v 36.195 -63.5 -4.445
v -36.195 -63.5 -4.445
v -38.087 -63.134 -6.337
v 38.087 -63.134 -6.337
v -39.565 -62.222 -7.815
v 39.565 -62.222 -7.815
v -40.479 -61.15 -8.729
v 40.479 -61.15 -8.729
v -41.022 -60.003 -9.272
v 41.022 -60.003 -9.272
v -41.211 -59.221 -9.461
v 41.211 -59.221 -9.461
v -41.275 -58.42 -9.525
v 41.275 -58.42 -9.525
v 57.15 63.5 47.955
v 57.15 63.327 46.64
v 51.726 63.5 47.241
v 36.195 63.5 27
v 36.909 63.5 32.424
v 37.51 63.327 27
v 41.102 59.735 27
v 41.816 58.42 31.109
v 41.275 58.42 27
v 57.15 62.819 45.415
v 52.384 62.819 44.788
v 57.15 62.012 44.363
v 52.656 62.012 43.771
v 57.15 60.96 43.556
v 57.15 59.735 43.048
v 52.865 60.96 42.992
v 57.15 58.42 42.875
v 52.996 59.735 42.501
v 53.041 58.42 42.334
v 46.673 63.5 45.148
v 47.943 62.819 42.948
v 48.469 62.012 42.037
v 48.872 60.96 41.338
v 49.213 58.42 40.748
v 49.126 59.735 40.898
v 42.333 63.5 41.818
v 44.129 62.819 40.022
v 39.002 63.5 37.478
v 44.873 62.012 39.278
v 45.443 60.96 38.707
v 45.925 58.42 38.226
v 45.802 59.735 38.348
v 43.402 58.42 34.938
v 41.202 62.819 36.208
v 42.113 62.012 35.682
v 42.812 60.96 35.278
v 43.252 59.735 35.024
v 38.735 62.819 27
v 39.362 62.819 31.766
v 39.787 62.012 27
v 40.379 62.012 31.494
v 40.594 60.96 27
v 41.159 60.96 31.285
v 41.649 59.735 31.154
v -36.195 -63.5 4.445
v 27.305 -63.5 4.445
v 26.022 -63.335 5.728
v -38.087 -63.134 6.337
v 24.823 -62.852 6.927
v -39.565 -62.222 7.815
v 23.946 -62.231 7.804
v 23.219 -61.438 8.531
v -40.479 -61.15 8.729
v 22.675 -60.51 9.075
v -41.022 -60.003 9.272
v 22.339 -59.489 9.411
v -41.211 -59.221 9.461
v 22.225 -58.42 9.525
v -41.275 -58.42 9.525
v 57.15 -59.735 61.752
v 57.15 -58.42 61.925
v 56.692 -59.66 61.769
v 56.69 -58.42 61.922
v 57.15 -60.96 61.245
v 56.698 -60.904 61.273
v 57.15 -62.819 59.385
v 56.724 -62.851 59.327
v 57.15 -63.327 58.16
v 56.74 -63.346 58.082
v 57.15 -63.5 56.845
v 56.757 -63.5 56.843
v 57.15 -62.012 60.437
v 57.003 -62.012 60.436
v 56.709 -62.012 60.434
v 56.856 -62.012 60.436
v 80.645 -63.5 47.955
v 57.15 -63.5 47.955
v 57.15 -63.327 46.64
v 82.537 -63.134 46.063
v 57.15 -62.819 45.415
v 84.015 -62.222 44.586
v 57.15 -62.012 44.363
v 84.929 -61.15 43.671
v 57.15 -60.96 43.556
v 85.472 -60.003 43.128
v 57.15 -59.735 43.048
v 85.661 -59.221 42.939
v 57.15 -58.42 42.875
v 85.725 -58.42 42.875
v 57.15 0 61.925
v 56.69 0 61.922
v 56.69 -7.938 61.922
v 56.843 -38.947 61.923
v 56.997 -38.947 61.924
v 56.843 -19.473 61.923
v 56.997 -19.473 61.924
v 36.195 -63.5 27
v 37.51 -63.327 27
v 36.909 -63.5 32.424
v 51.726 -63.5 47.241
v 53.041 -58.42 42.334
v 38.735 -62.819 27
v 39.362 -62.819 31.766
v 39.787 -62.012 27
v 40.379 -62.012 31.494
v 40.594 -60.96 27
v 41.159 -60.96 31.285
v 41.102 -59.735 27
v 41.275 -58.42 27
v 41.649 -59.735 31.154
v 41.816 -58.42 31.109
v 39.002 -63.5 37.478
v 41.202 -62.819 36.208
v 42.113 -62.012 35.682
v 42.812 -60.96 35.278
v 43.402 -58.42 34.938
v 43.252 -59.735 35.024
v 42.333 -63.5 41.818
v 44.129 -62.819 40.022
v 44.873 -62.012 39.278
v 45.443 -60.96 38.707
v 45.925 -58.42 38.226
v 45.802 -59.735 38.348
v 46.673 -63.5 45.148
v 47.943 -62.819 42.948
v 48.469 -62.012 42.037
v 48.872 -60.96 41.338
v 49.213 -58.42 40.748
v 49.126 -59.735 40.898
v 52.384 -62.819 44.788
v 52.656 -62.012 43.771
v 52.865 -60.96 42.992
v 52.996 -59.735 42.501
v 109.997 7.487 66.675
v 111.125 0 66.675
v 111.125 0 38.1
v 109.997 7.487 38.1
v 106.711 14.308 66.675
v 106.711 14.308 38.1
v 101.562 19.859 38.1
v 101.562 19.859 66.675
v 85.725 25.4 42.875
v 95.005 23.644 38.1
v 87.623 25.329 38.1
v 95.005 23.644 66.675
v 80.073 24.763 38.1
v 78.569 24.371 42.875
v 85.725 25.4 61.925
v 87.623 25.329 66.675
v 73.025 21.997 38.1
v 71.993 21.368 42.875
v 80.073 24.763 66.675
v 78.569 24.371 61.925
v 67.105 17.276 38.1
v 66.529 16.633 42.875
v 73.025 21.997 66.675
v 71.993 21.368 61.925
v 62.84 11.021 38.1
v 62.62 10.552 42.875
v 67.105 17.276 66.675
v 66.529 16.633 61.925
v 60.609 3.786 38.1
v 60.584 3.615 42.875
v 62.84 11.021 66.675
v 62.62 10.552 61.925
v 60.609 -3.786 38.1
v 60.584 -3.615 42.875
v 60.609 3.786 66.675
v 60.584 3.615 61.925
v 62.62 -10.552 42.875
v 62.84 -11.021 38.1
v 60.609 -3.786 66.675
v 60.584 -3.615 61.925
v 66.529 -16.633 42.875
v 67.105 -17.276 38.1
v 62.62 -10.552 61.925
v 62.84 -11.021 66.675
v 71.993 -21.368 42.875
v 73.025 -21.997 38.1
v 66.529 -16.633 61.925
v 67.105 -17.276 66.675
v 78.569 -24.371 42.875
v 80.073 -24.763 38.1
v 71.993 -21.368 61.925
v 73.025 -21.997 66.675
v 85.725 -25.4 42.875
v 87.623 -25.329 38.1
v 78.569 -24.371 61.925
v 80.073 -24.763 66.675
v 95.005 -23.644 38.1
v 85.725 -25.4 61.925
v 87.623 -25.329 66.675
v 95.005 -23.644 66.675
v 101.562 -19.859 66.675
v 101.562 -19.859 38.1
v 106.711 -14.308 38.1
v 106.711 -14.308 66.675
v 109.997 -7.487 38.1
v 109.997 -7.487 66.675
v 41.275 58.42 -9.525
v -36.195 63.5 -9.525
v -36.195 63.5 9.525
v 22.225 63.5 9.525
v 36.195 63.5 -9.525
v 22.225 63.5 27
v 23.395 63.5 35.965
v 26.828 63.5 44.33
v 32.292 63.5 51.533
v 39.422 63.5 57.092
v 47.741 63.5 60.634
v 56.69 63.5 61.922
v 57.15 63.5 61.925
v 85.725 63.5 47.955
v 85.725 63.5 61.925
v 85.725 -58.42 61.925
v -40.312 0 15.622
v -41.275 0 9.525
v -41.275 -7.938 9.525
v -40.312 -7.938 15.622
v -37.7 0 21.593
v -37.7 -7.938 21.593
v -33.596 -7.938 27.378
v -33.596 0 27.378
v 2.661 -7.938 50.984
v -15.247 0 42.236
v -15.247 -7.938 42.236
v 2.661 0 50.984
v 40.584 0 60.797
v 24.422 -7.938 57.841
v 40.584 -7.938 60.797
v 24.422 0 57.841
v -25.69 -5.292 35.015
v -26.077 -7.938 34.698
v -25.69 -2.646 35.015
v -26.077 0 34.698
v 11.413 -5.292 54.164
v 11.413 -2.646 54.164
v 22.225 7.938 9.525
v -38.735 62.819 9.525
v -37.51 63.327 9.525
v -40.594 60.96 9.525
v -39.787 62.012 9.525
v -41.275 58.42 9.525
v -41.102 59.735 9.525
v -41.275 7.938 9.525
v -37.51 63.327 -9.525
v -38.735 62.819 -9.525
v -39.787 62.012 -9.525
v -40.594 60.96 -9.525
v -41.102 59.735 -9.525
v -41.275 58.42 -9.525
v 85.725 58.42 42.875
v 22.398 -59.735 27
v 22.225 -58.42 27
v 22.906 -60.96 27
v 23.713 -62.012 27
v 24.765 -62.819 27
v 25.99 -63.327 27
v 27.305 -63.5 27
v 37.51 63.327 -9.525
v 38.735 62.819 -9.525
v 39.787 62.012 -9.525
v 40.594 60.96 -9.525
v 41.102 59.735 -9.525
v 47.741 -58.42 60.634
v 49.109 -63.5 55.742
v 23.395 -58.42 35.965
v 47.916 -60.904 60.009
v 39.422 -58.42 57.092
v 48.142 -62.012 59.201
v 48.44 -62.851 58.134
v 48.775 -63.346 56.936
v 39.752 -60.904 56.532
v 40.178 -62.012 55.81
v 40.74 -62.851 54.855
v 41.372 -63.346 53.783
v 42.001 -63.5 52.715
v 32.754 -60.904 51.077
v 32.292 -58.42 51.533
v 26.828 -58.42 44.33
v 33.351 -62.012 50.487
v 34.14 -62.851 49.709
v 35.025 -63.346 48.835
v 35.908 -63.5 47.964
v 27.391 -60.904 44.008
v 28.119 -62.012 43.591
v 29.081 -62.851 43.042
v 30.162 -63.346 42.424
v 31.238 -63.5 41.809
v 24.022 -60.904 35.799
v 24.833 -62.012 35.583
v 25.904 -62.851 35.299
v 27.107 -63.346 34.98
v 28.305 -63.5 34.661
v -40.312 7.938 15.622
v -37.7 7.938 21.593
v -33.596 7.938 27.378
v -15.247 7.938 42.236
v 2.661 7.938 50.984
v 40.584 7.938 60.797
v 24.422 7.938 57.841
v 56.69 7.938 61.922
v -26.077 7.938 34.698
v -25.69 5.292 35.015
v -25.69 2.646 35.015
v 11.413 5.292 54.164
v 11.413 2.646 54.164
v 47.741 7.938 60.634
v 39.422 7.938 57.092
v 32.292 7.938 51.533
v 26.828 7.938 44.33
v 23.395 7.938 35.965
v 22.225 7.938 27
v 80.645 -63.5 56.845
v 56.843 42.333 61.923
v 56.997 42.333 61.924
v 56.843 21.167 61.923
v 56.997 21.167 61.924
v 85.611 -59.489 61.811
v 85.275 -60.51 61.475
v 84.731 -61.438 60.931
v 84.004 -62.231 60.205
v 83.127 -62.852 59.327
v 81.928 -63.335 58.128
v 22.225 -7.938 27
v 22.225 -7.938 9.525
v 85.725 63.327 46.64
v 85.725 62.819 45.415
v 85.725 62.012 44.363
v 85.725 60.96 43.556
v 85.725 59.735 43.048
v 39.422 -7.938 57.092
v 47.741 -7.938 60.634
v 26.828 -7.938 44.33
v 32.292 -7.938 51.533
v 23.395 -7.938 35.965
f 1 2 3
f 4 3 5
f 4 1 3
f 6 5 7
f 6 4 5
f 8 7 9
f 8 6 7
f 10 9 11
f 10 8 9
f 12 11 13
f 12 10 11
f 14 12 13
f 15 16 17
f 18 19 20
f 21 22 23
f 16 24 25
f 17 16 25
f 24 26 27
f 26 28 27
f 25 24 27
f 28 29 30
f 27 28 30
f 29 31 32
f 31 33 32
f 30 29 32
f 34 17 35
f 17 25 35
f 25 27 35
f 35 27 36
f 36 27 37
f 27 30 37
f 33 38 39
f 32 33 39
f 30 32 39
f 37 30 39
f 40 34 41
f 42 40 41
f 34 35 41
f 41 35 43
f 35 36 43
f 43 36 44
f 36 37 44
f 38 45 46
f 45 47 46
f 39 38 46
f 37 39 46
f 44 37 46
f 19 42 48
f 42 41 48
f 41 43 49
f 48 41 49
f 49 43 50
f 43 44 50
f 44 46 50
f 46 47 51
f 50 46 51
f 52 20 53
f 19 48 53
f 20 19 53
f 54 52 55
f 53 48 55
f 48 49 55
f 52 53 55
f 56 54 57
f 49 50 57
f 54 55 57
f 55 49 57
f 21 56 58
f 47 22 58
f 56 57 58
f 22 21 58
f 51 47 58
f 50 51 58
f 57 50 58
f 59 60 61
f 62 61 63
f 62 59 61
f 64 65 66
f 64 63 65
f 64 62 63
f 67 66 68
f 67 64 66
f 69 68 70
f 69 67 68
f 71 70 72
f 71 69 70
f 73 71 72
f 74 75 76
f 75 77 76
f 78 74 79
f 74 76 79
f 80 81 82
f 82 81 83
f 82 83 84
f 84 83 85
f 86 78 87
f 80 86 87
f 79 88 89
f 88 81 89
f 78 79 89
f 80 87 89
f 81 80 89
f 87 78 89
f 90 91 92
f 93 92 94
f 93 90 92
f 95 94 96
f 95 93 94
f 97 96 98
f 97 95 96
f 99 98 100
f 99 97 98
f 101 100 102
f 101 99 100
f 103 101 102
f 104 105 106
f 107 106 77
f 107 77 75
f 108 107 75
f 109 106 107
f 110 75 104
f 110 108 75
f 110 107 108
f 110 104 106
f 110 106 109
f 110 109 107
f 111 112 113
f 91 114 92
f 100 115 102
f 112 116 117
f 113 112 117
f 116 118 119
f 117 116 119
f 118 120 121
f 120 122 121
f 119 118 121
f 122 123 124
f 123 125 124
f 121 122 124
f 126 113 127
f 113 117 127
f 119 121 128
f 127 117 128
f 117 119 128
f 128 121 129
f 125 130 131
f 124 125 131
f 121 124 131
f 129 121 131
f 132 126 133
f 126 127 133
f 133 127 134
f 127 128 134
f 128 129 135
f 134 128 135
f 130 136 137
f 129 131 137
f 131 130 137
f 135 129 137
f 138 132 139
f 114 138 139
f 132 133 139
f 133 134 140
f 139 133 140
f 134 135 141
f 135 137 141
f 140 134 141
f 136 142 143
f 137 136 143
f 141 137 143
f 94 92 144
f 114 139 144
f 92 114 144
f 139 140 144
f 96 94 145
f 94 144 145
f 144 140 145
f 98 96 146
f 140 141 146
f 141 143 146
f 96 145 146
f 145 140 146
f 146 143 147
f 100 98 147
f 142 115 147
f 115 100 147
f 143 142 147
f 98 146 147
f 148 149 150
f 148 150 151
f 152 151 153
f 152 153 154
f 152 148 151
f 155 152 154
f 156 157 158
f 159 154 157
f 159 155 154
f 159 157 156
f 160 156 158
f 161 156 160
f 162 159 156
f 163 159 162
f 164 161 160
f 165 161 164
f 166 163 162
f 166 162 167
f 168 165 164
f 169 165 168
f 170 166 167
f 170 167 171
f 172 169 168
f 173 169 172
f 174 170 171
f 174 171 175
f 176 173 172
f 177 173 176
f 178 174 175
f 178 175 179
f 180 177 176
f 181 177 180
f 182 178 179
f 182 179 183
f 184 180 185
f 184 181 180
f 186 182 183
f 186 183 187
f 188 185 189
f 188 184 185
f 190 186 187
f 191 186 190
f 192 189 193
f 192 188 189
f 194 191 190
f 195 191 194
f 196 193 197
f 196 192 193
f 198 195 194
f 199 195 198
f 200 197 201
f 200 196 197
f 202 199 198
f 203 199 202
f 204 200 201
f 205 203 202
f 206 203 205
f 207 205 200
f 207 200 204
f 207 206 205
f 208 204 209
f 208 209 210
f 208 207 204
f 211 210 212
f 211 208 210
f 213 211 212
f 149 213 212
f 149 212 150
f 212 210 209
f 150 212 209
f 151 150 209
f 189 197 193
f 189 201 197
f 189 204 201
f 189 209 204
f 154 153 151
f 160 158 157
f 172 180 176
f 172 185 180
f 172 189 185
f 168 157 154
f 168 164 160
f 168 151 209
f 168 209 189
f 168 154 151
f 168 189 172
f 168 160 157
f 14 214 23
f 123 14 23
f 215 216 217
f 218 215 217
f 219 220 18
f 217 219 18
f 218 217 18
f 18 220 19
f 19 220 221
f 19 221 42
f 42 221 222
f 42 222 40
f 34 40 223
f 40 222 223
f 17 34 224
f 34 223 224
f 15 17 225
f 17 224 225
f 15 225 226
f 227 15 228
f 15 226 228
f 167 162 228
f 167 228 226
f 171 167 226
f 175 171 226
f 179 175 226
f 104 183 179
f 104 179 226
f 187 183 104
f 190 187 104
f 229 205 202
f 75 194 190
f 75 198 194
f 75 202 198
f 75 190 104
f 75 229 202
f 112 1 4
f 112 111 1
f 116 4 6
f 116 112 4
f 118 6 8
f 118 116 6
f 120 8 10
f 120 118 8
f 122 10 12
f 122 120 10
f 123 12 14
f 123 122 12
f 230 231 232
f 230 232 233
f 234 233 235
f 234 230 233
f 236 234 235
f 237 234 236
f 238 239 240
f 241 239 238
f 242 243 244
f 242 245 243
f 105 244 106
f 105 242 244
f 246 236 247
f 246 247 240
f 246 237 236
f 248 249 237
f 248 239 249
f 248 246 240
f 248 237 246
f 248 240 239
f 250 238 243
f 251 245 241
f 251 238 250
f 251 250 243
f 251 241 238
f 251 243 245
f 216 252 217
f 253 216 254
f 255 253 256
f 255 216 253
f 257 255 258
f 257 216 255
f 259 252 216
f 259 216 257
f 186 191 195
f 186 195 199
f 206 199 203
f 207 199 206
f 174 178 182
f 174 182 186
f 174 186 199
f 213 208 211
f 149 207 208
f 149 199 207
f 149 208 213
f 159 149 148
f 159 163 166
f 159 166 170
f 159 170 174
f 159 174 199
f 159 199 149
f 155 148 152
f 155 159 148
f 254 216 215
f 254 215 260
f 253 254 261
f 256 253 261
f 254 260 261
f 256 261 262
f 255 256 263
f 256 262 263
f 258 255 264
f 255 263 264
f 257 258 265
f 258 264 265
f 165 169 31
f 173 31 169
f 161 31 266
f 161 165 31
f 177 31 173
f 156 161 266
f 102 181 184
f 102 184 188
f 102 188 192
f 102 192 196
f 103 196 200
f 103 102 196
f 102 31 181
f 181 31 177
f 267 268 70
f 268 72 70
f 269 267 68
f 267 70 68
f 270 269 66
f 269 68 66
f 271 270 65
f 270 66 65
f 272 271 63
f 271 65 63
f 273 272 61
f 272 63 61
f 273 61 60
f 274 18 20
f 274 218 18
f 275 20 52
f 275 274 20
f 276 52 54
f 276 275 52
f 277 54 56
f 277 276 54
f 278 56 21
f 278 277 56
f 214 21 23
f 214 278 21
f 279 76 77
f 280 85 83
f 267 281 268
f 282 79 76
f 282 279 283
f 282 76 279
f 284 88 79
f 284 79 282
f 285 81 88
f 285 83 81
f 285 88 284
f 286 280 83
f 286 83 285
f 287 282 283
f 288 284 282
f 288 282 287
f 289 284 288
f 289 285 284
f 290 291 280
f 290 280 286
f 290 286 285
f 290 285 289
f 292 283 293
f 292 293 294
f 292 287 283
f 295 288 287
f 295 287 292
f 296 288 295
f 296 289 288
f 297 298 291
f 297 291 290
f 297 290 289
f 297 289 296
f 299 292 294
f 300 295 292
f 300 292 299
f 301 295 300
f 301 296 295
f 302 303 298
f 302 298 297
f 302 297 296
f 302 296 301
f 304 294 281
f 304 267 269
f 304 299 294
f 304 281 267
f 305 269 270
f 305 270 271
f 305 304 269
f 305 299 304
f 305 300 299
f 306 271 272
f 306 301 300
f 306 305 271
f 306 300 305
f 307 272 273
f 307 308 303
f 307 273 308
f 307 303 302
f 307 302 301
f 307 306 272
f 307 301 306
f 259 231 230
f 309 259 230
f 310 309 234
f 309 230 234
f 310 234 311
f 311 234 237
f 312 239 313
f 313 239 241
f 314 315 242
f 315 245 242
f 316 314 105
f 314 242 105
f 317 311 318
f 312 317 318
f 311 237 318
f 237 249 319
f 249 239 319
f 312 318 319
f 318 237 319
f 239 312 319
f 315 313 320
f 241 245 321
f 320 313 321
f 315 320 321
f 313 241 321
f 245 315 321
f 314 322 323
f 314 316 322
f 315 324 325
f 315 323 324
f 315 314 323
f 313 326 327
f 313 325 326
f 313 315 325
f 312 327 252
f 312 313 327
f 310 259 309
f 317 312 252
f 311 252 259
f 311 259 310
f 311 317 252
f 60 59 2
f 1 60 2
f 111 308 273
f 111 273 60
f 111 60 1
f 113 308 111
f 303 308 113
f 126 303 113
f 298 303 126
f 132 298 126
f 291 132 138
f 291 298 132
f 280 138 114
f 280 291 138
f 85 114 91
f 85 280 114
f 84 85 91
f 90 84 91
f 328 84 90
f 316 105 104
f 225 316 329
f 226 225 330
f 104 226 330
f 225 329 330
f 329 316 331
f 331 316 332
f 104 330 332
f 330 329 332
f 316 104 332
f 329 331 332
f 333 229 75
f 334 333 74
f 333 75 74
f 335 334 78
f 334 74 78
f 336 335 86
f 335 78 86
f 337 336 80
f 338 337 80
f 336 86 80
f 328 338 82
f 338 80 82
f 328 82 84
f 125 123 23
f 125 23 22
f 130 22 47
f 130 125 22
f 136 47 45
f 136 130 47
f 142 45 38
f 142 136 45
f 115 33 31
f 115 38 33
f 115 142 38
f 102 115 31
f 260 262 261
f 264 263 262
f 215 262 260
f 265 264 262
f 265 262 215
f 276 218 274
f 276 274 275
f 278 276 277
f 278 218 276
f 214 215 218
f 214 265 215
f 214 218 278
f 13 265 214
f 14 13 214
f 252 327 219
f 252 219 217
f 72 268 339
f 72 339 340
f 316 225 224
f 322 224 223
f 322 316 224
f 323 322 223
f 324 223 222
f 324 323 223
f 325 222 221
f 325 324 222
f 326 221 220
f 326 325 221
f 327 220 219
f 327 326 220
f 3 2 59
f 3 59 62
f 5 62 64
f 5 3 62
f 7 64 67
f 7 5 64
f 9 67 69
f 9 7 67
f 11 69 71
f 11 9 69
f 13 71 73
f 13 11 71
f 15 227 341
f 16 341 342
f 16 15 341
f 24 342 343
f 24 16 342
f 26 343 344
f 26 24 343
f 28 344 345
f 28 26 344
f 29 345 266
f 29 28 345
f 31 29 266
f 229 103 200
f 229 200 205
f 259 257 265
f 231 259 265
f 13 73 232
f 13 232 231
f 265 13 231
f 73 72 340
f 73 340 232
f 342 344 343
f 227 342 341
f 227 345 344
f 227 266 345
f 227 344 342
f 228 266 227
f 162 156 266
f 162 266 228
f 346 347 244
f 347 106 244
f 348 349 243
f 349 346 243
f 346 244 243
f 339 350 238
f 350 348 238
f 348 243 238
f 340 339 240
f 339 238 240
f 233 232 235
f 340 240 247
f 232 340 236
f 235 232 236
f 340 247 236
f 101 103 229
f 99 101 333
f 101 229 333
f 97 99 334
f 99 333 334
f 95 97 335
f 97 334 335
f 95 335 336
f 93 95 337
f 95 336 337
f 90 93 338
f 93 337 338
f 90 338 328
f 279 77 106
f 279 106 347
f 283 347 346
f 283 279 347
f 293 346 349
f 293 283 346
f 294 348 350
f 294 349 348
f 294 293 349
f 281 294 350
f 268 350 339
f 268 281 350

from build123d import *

# Parameters (mm, degrees)
F1_DEPTH = 63.5
F0_W     = 25.4
F0_H     = 19.05
F2_DEPTH = 63.5
F3_DEPTH = 7.9375
F5_R     = 5.08


with BuildPart() as f1:
    # F0 (on Front) → F1 (new body, symmetric)
    with BuildSketch(Plane.XZ):
        Polygon((-41.275, 9.525), (-41.275, -9.525), (41.275, -9.525), (41.275, 9.525), (22.225, 9.525), align=None)
    extrude(amount=F1_DEPTH, both=True)

    # F0 (on Front) → F2 (join, symmetric)
    with BuildSketch(Plane.XZ):
        with BuildLine():
            Line((22.225, 9.525), (41.275, 9.525))
            Line((41.275, 9.525), (41.275, 27.0002))
            ThreePointArc((41.275, 27.0002), (45.9246798487, 38.2255201513), (57.15, 42.8752))
            Line((57.15, 42.8752), (60.325, 42.8752))
            Line((60.325, 42.8752), (60.325, 61.9252))
            Line((60.325, 61.9252), (57.15, 61.9252))
            add(Edge.make_bspline(
                [(56.6897359672, 61.9221670411), (56.8432487019, 61.9234663989), (56.9966708454, 61.9244776876), (57.15, 61.9252)],
                knots=[111.1247319335, 111.1247319335, 111.1247319335, 111.1247319335, 111.5045361635, 111.5045361635, 111.5045361635, 111.5045361635], degree=3))
            ThreePointArc((56.6897359672, 61.9221670411), (32.2921003869, 51.5326367283), (22.225, 27.0002))
            Line((22.225, 27.0002), (22.225, 9.525))
        make_face()
        with Locations((73.025, 52.4002)):
            Rectangle(F0_W, F0_H)
    extrude(amount=F2_DEPTH, both=True)

    # F0 (on Front) → F3 (join, symmetric)
    with BuildSketch(Plane.XZ):
        with BuildLine():
            add(Edge.make_bspline(
                [(-41.275, 9.525), (-40.8962016322, 36.5015194538), (11.7743291488, 61.5419954401), (56.6897359672, 61.9221670411)],
                knots=[0, 0, 0, 0, 111.1247319335, 111.1247319335, 111.1247319335, 111.1247319335], degree=3))
            Line((-41.275, 9.525), (22.225, 9.525))
            Line((22.225, 9.525), (22.225, 27.0002))
            ThreePointArc((22.225, 27.0002), (32.2921003869, 51.5326367283), (56.6897359672, 61.9221670411))
        make_face()
    extrude(amount=F3_DEPTH, both=True)

    # F0 (on Front) → F4 (revolve)
    with BuildSketch(Plane.XZ):
        Polygon((85.725, 66.675), (85.725, 61.9252), (85.725, 42.8752), (85.725, 38.1), (111.125, 38.1), (111.125, 66.675), align=None)
    revolve(axis=Axis((85.725, 0, 52.3875), (0, 0, 1)))

    # F5
    f5_edges = [f1.edges().sort_by_distance(p)[0] for p in [
        (-41.275, -63.5, 0),
        (0, -63.5, -9.525),
        (41.275, -63.5, 8.7376),
        (45.92468, -63.5, 38.22552),
        (71.4375, -63.5, 42.8752),
        (85.725, -63.5, 52.4002),
        (71.4375, -63.5, 61.9252),
        (56.919867, -63.5, 61.923899),
        (32.2921, -63.5, 51.532637),
        (22.225, -63.5, 18.2626),
        (-9.525, -63.5, 9.525),
        (41.275, 63.5, 8.7376),
        (-41.275, 63.5, 0),
    ]]
    fillet(f5_edges, radius=F5_R)


solid = f1.part
